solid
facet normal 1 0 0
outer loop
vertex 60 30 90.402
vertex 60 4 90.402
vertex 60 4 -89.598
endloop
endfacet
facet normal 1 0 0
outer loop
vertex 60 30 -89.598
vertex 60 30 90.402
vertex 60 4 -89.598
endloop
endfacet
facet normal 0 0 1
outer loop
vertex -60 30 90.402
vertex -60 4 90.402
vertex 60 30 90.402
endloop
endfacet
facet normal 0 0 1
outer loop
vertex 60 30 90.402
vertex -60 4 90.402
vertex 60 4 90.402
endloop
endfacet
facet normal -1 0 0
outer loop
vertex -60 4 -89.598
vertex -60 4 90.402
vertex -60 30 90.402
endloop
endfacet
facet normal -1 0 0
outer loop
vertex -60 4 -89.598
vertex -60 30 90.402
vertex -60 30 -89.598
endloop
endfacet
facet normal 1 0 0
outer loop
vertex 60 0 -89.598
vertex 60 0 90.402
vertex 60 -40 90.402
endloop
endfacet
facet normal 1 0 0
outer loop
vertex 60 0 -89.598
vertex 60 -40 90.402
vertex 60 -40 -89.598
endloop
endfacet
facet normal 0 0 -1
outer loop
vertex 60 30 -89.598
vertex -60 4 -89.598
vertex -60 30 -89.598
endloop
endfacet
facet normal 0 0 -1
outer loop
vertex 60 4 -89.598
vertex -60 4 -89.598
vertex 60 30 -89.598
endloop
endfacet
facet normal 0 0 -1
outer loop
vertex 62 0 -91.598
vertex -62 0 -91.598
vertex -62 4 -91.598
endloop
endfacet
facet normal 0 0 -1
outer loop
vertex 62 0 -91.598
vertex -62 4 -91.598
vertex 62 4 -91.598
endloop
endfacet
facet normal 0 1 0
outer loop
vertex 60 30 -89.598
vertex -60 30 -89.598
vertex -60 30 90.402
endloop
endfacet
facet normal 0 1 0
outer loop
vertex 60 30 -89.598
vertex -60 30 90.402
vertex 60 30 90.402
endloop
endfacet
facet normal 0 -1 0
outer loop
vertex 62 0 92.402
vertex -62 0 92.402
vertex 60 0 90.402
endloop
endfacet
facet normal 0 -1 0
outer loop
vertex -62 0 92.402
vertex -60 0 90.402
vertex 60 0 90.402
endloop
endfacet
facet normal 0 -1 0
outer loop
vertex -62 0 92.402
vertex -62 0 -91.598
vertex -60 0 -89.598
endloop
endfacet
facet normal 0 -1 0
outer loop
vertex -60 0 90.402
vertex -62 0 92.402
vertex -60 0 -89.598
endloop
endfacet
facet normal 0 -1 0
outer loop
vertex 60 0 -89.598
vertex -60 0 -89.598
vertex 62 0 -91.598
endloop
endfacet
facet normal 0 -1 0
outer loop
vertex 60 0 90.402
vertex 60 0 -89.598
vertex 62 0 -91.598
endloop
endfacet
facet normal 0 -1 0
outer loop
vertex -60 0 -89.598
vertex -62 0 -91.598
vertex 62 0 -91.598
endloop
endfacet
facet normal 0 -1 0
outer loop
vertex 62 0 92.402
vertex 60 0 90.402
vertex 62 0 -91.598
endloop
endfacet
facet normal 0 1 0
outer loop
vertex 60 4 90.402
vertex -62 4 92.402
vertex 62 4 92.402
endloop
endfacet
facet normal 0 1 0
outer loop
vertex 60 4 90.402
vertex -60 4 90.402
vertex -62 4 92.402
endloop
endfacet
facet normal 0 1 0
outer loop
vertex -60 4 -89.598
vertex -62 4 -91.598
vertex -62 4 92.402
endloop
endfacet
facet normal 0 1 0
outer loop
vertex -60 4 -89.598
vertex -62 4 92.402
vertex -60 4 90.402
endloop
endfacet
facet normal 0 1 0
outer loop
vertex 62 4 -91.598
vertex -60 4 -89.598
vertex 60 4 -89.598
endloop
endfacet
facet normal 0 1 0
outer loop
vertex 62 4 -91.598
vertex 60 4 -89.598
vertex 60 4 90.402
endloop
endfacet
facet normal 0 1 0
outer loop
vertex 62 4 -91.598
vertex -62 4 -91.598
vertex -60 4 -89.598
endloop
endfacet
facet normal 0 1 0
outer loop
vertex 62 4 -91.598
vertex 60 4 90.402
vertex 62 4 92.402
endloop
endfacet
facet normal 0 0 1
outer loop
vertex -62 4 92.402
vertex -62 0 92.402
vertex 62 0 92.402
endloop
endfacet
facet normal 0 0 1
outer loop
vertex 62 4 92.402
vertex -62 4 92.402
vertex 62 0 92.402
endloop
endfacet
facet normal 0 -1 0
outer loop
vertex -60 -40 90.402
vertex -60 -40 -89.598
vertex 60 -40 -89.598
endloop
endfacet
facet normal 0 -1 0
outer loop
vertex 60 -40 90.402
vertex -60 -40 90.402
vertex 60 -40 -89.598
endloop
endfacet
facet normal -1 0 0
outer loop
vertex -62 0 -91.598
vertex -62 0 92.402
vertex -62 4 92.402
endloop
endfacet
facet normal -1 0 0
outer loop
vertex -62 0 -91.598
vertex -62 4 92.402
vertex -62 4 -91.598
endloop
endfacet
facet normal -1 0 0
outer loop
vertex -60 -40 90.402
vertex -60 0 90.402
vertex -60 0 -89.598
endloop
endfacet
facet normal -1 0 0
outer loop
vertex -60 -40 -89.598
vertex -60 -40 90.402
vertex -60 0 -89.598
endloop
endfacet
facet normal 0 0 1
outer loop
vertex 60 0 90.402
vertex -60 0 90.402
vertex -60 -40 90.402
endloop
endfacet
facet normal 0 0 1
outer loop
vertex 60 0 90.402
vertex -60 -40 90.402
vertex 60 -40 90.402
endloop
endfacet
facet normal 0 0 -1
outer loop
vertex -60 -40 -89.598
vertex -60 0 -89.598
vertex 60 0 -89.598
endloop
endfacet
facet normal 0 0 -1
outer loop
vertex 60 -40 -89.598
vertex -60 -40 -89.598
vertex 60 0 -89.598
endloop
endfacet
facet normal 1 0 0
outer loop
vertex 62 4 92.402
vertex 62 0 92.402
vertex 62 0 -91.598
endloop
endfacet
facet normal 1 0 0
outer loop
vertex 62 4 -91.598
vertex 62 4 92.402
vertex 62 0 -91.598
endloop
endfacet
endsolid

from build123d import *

# Parameters (mm, degrees)
SKETCH1_W                = 124
SKETCH1_H                = 184
SKETCH1_W_2              = 120
SKETCH1_H_2              = 180
BOSS_EXTRUDE1_DEPTH      = 4
BOSS_EXTRUDE2_DEPTH      = 30
BOSS_EXTRUDE2_DEPTH_BACK = 40
SKETCH1_3_W              = 120
SKETCH1_3_H              = 180


with BuildPart() as part:
    # Sketch1 → Boss-Extrude1 (new body)
    with BuildSketch(Plane(origin=(0, 0, 0), x_dir=(1, 0, 0), z_dir=(0, 1, 0))):
        with Locations((0, -0.402295225)):
            Rectangle(SKETCH1_W, SKETCH1_H)
        with Locations((0, -0.402295225)):
            Rectangle(SKETCH1_W_2, SKETCH1_H_2, mode=Mode.SUBTRACT)
    extrude(amount=BOSS_EXTRUDE1_DEPTH)

    # Sketch1<3> → Boss-Extrude2 (add, two sides: drawn at the far end of the back side and taken through both)
    with BuildSketch(Plane(origin=(0, 0, 0), x_dir=(1, 0, 0), z_dir=(0, 1, 0)).offset(-BOSS_EXTRUDE2_DEPTH_BACK)):
        with Locations((0, -0.402295225)):
            Rectangle(SKETCH1_3_W, SKETCH1_3_H)
    extrude(amount=BOSS_EXTRUDE2_DEPTH + BOSS_EXTRUDE2_DEPTH_BACK)


solid = part.part
